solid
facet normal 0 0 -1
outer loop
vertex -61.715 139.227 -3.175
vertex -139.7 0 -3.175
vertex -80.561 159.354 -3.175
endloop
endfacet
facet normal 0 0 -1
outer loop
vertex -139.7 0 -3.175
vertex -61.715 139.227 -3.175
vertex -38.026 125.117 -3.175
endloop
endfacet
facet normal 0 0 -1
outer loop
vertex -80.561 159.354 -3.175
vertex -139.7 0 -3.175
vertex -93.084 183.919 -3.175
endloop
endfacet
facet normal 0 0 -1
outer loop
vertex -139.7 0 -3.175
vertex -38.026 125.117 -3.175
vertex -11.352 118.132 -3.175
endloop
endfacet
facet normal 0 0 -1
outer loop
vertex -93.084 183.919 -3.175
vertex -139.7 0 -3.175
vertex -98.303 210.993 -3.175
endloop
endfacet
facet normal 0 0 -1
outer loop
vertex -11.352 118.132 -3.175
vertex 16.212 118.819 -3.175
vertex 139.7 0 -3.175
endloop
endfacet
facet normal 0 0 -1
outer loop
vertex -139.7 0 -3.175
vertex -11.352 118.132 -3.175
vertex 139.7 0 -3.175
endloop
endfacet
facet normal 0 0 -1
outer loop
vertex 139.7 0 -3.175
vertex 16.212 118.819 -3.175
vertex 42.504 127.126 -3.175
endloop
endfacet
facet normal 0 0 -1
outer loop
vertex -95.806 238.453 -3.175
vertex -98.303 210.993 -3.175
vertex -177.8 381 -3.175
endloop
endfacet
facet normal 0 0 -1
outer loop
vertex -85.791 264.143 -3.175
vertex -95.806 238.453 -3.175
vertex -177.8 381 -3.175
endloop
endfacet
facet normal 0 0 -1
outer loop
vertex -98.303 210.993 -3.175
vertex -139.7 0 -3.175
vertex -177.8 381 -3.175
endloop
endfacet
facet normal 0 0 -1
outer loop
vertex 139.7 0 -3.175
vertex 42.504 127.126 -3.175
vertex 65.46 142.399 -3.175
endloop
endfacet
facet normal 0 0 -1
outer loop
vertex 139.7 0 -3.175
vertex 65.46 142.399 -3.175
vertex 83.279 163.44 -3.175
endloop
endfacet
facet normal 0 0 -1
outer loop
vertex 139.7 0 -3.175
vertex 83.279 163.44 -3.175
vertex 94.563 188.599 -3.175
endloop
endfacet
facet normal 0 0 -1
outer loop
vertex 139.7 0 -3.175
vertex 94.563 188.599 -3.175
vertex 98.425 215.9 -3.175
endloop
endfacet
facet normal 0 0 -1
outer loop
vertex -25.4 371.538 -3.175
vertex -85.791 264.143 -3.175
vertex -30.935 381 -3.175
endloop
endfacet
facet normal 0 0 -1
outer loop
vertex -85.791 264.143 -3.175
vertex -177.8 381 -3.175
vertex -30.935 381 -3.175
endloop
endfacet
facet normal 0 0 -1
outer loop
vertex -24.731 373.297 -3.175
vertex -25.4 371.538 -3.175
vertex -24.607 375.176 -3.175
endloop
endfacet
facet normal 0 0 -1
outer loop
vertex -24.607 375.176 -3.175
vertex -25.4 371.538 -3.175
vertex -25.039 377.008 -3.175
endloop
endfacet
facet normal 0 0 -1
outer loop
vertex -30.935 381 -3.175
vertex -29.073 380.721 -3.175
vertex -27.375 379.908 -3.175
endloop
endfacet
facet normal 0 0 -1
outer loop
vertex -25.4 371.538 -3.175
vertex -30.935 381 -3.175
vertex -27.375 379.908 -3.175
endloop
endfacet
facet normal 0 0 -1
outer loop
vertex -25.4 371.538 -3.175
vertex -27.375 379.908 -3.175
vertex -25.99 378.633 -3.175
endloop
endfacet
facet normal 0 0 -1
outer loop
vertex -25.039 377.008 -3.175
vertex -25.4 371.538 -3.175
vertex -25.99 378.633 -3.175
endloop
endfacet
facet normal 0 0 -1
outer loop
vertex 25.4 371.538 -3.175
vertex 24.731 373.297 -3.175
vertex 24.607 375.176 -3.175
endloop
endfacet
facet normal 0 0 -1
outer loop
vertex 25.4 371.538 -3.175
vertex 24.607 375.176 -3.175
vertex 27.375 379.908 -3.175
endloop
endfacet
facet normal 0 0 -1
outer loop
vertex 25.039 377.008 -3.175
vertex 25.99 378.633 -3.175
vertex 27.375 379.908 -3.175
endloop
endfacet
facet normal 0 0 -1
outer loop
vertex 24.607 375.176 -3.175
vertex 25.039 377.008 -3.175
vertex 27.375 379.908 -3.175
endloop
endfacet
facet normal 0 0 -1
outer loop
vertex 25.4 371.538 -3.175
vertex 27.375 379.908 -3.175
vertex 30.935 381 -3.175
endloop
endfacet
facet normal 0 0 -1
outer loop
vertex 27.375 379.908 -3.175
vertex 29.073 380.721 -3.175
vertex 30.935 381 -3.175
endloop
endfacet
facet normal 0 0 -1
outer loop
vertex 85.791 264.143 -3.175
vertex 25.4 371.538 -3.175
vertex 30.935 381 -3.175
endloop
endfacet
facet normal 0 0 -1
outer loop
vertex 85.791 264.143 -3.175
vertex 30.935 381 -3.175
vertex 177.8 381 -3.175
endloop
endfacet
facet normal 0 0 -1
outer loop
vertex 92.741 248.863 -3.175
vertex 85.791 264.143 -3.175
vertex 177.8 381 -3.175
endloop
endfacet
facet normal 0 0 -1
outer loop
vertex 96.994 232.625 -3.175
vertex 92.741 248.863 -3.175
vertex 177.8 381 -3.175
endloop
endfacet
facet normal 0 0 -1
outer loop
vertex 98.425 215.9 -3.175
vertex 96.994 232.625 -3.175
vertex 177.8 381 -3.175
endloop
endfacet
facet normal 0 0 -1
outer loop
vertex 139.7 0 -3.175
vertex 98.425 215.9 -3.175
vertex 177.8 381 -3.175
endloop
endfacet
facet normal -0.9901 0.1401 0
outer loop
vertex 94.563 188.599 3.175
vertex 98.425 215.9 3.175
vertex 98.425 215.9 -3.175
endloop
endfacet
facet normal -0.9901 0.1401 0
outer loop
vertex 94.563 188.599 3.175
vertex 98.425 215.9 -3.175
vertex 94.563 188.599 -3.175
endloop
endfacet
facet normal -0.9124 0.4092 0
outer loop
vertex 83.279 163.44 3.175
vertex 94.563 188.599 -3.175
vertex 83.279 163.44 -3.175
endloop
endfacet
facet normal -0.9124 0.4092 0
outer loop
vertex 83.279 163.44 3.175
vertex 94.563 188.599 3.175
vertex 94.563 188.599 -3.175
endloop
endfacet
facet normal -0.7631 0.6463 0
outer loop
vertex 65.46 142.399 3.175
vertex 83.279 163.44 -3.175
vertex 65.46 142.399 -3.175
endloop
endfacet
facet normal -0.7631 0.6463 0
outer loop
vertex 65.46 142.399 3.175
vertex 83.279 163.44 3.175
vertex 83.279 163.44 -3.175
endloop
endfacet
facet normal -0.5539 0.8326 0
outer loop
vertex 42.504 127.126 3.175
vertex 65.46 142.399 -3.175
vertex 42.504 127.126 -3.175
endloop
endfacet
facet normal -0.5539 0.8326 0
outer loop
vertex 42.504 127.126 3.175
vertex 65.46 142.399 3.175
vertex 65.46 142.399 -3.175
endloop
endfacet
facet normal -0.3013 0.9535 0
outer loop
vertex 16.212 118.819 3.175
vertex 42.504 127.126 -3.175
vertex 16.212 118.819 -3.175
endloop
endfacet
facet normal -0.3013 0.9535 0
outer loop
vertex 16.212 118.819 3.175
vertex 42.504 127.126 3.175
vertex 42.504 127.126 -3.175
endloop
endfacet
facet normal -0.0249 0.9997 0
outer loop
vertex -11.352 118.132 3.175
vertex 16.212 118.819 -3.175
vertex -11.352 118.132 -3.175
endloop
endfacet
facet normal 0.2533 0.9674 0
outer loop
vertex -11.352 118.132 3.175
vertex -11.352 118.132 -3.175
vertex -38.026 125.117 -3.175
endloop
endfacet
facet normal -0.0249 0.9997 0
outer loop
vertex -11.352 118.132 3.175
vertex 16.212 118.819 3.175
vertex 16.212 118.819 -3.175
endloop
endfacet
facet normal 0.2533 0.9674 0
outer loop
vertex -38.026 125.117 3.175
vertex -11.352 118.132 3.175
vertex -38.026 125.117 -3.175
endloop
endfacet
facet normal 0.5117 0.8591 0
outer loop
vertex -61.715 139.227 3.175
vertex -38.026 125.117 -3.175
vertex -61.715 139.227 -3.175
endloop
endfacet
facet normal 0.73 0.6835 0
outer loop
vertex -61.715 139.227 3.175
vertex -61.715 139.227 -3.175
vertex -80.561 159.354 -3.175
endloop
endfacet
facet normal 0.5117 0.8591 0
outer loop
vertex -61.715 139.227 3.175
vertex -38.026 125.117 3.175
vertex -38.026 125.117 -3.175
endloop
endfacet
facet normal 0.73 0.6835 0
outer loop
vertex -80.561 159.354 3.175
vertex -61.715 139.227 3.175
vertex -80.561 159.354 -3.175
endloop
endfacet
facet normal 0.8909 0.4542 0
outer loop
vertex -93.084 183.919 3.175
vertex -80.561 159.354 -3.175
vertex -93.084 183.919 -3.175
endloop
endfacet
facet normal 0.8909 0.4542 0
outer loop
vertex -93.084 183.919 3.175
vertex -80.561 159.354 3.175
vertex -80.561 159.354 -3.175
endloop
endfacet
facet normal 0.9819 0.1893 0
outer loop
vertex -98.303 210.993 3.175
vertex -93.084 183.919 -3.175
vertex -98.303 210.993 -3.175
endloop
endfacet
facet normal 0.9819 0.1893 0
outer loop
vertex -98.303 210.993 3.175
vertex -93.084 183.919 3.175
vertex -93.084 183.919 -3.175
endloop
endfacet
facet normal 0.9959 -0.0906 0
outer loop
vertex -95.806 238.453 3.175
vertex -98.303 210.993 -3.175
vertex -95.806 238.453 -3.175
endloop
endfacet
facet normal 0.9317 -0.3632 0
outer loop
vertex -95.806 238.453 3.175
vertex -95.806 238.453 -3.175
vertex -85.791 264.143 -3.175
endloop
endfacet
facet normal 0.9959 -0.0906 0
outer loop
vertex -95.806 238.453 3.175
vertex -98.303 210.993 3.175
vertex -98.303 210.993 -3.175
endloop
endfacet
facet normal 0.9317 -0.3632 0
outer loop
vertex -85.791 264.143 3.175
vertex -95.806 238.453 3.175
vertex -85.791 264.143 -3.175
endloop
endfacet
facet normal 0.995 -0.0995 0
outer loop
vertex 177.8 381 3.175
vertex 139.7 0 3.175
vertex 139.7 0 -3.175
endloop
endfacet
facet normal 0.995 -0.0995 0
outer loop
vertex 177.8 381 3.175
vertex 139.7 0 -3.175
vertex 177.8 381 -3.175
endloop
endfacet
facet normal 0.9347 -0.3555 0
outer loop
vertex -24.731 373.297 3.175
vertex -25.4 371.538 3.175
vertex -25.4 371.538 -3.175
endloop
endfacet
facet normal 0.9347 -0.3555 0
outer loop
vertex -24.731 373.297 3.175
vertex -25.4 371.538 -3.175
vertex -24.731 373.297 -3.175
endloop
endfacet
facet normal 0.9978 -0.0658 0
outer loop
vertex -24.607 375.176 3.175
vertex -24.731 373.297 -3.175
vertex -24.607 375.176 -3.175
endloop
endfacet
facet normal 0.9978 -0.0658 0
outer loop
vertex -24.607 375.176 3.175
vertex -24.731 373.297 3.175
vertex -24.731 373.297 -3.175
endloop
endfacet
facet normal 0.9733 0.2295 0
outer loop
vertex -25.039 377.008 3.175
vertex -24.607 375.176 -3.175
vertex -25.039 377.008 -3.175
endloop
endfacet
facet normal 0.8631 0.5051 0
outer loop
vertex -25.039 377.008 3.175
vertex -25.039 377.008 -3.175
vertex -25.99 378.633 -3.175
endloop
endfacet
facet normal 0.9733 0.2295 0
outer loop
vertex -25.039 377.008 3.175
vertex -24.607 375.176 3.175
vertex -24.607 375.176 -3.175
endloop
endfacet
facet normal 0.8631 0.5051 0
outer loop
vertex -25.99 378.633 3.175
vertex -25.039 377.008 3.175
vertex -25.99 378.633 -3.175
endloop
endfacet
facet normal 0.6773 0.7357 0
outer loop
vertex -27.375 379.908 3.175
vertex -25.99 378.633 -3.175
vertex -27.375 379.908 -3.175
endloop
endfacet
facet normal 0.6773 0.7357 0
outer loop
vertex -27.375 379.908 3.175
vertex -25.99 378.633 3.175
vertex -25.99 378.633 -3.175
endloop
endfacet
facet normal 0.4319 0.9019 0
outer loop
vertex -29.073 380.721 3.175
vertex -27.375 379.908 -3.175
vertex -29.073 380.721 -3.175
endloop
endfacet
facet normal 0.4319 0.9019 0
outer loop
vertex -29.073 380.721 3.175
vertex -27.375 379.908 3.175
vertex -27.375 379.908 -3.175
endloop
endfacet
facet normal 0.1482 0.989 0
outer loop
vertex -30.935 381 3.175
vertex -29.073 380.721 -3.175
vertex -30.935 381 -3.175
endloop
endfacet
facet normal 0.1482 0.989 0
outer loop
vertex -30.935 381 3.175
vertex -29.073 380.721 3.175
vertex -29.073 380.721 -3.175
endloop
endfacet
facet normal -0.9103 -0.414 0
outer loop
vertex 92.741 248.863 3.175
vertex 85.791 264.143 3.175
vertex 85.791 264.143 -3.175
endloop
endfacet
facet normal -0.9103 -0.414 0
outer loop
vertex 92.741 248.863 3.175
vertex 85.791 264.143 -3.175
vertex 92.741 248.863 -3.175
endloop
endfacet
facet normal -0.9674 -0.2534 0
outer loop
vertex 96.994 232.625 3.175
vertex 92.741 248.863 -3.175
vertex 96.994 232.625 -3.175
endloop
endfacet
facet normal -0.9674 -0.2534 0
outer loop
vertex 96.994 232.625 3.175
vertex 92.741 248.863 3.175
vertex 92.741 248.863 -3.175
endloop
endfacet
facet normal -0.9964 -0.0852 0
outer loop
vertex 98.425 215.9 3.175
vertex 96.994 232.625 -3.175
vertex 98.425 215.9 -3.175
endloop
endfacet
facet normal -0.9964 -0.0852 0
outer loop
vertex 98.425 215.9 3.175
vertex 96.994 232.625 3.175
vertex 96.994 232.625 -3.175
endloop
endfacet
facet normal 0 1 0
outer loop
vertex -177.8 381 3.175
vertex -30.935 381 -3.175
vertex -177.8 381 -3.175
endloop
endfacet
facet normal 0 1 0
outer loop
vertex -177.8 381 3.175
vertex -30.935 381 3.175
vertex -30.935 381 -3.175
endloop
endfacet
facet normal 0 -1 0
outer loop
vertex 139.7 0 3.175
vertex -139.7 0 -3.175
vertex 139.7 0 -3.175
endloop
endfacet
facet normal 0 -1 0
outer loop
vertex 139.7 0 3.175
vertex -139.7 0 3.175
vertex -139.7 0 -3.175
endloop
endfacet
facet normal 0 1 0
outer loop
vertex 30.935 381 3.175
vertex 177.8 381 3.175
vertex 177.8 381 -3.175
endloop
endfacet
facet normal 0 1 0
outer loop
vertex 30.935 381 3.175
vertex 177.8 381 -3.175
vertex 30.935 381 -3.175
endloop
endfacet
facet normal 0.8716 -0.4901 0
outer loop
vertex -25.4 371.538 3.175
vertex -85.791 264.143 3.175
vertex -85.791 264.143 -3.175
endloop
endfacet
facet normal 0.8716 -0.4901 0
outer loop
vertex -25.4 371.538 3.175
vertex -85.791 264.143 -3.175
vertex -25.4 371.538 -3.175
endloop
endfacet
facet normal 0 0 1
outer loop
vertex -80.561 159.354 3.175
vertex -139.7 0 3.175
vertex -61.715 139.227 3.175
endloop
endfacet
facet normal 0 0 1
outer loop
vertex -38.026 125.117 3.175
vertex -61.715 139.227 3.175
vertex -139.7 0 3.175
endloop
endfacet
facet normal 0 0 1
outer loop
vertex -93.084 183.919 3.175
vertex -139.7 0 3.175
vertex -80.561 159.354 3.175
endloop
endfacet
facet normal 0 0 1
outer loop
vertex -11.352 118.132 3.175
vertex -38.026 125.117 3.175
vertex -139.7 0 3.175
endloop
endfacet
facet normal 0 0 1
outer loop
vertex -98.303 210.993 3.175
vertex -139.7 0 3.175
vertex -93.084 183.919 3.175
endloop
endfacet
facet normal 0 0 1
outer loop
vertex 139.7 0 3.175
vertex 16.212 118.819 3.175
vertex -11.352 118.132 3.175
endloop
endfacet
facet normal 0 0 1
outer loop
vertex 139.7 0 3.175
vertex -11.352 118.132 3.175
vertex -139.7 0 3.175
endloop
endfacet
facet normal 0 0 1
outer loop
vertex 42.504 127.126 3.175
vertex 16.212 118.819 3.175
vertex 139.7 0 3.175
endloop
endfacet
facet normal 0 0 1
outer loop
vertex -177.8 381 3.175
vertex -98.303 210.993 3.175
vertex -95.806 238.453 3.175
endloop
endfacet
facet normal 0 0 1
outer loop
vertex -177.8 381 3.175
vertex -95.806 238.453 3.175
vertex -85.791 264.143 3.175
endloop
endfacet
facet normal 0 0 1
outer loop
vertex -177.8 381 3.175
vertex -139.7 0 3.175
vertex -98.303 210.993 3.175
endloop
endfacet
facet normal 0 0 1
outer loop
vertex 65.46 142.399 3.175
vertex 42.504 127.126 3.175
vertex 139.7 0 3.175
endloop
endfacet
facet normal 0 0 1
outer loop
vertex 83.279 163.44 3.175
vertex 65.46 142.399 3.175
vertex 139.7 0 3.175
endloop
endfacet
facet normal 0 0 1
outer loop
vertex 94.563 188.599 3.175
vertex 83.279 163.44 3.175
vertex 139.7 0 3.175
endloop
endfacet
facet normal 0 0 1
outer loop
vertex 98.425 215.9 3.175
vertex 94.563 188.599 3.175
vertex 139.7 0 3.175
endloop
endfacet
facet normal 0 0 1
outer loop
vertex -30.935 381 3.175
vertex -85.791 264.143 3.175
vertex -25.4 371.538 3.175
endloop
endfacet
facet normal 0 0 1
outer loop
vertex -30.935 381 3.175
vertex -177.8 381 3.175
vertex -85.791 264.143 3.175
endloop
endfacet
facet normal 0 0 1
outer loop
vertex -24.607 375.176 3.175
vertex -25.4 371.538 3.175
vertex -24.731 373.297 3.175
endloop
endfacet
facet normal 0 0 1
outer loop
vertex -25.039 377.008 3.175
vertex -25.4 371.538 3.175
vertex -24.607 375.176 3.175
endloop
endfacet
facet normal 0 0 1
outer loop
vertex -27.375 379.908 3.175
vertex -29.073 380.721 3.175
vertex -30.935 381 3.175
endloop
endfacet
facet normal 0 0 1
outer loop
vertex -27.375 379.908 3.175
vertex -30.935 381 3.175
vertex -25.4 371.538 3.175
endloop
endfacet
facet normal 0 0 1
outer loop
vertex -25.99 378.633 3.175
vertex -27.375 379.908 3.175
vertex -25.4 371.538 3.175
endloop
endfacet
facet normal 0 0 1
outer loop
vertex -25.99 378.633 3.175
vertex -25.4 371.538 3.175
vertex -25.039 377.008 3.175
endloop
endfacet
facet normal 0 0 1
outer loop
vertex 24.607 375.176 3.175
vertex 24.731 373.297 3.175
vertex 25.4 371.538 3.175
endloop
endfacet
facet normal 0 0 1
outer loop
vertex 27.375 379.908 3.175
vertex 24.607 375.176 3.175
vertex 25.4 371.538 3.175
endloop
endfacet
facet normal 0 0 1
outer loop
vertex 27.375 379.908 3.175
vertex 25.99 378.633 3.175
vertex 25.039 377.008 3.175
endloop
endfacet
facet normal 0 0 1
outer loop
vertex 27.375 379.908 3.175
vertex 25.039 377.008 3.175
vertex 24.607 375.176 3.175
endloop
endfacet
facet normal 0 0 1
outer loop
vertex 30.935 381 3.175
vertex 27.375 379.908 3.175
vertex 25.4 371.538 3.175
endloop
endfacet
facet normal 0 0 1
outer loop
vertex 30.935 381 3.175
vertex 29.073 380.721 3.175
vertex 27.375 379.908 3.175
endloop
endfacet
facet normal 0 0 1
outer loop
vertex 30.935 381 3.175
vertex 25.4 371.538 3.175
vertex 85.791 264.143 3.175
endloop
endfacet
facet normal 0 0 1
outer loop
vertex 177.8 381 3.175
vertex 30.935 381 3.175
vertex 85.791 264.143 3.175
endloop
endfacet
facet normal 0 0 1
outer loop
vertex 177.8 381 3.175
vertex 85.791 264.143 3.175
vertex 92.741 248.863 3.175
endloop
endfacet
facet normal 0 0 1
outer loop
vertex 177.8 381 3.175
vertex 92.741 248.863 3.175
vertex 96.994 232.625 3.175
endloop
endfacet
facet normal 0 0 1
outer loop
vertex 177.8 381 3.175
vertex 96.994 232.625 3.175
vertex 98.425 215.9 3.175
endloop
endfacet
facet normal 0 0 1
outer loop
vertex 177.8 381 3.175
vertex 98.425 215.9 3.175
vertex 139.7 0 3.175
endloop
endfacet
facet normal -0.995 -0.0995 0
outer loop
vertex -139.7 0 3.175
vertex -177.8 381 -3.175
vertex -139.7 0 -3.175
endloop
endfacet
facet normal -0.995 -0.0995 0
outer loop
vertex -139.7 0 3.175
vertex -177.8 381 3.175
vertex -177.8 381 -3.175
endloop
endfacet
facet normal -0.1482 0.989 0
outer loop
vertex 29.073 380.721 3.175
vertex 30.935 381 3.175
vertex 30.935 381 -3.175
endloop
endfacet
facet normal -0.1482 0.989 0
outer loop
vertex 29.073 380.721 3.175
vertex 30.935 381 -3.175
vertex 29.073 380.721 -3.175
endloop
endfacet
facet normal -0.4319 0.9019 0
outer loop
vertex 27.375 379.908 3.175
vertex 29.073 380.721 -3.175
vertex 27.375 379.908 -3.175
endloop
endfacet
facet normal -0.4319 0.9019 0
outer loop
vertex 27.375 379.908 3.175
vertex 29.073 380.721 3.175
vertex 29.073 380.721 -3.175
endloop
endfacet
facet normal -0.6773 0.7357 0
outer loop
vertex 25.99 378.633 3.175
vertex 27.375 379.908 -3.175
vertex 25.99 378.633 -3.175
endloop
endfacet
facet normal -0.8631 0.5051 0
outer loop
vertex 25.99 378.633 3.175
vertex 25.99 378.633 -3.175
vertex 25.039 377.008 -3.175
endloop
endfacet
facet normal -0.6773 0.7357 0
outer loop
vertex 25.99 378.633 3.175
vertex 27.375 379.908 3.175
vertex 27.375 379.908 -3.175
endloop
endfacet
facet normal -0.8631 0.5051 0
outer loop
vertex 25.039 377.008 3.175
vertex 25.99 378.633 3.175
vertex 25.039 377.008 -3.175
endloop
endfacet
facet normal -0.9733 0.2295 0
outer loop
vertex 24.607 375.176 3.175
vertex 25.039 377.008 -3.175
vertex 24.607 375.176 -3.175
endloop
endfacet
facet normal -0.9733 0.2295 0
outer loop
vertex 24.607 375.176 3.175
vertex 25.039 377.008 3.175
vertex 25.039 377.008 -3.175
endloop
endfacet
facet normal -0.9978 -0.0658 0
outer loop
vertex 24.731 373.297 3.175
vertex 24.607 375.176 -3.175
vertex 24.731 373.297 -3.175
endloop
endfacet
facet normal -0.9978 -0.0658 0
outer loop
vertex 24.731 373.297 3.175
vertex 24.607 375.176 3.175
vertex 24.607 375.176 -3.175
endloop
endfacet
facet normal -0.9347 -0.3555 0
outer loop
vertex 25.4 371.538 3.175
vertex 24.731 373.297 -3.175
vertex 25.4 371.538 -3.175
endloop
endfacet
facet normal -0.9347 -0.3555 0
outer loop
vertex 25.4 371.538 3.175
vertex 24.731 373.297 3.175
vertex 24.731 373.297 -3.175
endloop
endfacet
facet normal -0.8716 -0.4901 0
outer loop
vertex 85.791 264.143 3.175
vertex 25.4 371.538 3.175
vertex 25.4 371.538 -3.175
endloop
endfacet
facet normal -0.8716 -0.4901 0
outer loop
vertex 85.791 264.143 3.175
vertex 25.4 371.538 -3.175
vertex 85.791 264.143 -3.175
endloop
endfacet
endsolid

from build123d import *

# Parameters (mm, degrees)
F1_DEPTH = 3.175


with BuildPart() as f1:
    # F0 (on Top) → F1 (new body, symmetric)
    with BuildSketch(Plane.XY):
        with BuildLine():
            Line((-139.7, 0), (0, 0))
            Line((0, 0), (139.7, 0))
            Line((139.7, 0), (177.8, 381))
            Line((177.8, 381), (30.934911, 381))
            ThreePointArc((30.934911, 381), (25.45374, 377.856129), (25.4, 371.537564))
            Line((25.4, 371.537564), (85.791121, 264.142763))
            ThreePointArc((85.791121, 264.142763), (95.214158, 240.834811), (98.425, 215.9))
            ThreePointArc((98.425, 215.9), (-24.934811, 120.685842), (-85.791121, 264.142763))
            Line((-85.791121, 264.142763), (-25.4, 371.537564))
            ThreePointArc((-25.4, 371.537564), (-25.45374, 377.856129), (-30.934911, 381))
            Line((-30.934911, 381), (-177.8, 381))
            Line((-177.8, 381), (-139.7, 0))
        make_face()
    extrude(amount=F1_DEPTH, both=True)


solid = f1.part
